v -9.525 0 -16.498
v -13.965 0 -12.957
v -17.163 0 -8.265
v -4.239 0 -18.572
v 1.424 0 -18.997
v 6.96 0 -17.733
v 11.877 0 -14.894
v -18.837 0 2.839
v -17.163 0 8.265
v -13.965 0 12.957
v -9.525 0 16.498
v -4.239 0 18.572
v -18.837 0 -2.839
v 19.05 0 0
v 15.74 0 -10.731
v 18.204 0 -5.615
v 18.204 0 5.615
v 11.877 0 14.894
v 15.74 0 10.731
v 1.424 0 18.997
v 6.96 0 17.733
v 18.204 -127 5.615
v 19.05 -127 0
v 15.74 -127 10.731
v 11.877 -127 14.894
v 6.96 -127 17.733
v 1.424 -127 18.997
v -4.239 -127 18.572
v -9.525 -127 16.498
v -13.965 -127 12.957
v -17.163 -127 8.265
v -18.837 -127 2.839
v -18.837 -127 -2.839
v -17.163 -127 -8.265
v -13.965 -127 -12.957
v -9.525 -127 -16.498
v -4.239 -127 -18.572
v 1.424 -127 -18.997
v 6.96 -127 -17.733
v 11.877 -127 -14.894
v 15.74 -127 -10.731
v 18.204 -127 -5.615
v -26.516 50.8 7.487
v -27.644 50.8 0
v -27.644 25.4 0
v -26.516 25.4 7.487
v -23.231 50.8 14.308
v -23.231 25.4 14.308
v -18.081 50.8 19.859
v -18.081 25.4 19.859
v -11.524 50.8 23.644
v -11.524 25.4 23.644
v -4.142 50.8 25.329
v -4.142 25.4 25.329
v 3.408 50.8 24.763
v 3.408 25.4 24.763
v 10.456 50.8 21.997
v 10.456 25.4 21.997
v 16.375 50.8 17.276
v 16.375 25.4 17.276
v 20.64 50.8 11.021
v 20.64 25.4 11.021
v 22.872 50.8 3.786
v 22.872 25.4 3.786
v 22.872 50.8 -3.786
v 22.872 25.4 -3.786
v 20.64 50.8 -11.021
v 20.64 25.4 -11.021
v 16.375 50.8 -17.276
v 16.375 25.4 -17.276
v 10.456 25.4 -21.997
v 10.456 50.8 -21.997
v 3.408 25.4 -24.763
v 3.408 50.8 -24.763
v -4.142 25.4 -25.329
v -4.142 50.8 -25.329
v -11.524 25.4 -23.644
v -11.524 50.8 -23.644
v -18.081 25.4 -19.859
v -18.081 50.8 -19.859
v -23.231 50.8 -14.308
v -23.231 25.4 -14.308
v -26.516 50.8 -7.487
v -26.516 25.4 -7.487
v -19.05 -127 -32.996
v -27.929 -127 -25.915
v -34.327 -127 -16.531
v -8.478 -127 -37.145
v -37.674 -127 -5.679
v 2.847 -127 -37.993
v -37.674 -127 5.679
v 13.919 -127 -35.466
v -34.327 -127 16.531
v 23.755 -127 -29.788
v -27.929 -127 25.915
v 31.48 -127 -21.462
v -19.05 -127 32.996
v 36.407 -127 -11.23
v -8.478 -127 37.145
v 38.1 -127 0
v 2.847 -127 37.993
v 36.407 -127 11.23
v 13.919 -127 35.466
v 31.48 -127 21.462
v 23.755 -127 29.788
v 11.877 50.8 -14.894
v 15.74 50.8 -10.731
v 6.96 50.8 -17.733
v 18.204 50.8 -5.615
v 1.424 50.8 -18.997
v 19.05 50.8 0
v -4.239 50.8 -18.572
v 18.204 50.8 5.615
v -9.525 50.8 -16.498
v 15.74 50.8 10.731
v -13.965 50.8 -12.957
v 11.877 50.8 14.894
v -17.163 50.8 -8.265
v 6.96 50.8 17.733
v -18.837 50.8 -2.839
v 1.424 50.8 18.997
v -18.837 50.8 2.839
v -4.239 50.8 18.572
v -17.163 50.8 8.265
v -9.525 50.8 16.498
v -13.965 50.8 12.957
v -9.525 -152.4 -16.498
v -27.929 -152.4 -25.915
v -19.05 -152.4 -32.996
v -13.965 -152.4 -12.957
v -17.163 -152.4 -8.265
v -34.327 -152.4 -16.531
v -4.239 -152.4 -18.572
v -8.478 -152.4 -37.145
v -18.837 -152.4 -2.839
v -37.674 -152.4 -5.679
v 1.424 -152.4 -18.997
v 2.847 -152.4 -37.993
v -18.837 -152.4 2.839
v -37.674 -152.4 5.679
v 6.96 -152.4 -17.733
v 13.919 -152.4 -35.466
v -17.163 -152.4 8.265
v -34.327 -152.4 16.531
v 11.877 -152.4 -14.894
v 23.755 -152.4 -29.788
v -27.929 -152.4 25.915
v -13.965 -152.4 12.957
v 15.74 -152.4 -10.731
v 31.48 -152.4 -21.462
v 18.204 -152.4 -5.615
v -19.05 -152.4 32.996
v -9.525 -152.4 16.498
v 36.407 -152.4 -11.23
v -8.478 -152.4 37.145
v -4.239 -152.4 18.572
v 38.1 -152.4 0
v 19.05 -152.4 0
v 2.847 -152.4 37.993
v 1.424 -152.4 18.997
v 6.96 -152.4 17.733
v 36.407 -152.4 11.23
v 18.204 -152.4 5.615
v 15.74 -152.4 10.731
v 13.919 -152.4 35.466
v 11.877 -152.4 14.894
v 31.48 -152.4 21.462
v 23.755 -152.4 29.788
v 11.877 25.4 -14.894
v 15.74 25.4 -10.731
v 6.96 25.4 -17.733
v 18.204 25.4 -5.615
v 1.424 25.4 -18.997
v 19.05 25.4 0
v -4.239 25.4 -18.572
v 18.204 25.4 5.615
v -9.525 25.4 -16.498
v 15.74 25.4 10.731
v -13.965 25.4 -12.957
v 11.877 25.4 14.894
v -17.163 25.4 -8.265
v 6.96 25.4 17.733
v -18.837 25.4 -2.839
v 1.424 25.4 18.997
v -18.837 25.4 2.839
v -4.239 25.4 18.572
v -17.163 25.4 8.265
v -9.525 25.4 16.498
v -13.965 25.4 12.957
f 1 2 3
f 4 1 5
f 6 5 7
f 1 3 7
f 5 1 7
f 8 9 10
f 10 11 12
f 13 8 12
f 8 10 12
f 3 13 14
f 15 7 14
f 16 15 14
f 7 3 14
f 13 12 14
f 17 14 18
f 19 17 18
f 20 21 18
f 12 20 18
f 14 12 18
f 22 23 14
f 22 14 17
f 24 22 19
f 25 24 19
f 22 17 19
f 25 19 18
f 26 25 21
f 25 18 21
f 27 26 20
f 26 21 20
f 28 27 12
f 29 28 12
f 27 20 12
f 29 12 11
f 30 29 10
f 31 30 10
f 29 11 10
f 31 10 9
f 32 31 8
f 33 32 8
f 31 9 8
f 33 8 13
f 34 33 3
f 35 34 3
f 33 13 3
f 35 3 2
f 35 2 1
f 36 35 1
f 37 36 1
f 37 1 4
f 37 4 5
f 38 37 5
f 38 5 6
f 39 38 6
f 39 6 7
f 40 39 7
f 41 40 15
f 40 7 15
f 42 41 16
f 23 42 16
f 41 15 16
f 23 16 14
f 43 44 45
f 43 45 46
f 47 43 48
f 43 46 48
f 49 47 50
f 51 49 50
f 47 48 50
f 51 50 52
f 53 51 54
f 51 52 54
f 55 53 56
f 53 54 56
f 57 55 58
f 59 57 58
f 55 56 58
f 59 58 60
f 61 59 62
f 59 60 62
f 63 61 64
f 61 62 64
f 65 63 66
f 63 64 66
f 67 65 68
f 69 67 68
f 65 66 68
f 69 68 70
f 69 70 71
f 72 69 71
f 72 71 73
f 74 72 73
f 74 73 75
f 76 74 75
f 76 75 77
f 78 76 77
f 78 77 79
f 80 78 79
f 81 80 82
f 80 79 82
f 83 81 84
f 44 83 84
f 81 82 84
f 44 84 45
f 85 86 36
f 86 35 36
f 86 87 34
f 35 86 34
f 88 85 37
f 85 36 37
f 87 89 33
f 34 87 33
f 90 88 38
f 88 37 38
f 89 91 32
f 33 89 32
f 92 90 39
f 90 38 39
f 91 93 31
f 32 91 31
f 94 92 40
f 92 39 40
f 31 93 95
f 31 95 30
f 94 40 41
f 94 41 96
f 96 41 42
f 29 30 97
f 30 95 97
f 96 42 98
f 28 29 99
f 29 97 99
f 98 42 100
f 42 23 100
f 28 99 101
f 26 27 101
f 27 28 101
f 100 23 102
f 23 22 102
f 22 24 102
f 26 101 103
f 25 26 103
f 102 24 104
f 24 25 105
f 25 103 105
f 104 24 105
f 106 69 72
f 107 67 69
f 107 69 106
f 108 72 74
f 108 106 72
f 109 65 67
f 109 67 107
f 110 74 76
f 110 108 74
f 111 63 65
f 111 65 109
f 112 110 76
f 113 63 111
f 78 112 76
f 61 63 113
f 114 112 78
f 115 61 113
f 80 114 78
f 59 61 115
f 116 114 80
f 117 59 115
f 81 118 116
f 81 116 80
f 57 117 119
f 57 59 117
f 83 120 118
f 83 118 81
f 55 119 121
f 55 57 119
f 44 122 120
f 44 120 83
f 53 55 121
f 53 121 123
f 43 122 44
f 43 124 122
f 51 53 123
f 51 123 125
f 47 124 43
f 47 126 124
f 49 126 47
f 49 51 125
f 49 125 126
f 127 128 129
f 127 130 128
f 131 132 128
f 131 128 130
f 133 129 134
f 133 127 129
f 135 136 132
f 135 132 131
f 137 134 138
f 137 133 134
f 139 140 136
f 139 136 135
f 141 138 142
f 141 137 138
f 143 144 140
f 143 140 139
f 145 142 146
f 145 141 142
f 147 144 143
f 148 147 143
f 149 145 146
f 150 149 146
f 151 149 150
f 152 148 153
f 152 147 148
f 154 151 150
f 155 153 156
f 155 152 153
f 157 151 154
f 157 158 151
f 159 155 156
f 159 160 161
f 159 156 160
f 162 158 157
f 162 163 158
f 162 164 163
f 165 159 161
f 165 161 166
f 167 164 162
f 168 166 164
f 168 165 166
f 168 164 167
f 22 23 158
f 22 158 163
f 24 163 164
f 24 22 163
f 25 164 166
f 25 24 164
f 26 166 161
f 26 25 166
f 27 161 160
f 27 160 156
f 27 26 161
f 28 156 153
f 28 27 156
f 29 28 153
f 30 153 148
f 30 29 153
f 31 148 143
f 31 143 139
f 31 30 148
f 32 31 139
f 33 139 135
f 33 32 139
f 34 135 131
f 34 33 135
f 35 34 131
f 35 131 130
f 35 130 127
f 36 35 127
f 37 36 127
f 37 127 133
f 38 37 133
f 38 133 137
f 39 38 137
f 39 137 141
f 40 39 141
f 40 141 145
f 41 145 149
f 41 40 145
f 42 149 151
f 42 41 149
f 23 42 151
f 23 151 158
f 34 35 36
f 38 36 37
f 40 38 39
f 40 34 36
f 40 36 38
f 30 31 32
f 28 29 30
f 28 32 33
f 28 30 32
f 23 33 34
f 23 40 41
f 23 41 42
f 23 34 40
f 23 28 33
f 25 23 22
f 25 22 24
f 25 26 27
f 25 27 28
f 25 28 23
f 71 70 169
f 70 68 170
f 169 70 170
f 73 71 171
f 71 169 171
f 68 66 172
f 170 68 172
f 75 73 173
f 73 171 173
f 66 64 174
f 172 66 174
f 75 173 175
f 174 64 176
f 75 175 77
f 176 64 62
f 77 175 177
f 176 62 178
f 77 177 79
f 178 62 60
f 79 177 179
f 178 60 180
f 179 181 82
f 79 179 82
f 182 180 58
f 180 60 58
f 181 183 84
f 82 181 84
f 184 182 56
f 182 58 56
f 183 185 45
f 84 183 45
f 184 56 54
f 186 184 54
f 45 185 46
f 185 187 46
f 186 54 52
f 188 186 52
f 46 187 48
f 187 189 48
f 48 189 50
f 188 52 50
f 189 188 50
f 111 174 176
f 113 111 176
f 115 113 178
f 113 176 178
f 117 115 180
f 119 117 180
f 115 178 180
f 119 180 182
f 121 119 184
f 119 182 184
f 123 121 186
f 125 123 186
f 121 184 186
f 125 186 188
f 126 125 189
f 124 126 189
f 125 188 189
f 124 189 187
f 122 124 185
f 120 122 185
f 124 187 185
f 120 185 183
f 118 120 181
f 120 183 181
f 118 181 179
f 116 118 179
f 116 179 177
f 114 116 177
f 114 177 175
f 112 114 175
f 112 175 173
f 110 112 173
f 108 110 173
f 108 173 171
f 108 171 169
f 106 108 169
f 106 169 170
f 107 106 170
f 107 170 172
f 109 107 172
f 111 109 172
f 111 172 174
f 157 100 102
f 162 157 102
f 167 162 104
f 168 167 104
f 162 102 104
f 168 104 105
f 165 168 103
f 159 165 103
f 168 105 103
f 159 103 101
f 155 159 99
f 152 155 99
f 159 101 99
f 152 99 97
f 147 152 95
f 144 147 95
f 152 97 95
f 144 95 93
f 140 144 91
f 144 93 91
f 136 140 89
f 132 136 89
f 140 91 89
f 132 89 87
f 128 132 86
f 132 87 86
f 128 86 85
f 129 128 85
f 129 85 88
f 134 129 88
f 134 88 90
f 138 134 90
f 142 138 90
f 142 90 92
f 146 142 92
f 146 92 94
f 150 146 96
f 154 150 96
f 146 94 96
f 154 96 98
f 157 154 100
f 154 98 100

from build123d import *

# Parameters (mm, degrees)
F0_R     = 19.05
F1_DEPTH = 127
F3_R     = 25.4
F4_DEPTH = 25.4
F6_D     = 38.1
F7_R     = 38.1
F7_R_2   = 19.05
F8_DEPTH = 25.4


with BuildPart() as f1:
    # F0 (on Front) → F1 (new body)
    with BuildSketch(Plane.XZ):
        Circle(F0_R)
    extrude(amount=F1_DEPTH)


with BuildPart() as f4:
    # F3 (on offset) → F4 (new body)
    with BuildSketch(Plane(origin=(0, 25.4, 0), x_dir=(-1, 0, 0), z_dir=(0, 1, 0))):
        with Locations((2.2442061454, 0)):
            Circle(F3_R)
    extrude(amount=F4_DEPTH)

    # F6 (through all)
    with Locations(Plane(origin=(0, 50.8, 0), x_dir=(-1, 0, 0), z_dir=(0, 1, 0))):
        with Locations((0, 0)):
            Hole(F6_D / 2)


with BuildPart() as f8:
    # F7 (on face) → F8 (new body)
    with BuildSketch(Plane.XZ.offset(127)):
        Circle(F7_R)
        Circle(F7_R_2, mode=Mode.SUBTRACT)
    extrude(amount=F8_DEPTH)


solid = Compound([f1.part, f4.part, f8.part])
